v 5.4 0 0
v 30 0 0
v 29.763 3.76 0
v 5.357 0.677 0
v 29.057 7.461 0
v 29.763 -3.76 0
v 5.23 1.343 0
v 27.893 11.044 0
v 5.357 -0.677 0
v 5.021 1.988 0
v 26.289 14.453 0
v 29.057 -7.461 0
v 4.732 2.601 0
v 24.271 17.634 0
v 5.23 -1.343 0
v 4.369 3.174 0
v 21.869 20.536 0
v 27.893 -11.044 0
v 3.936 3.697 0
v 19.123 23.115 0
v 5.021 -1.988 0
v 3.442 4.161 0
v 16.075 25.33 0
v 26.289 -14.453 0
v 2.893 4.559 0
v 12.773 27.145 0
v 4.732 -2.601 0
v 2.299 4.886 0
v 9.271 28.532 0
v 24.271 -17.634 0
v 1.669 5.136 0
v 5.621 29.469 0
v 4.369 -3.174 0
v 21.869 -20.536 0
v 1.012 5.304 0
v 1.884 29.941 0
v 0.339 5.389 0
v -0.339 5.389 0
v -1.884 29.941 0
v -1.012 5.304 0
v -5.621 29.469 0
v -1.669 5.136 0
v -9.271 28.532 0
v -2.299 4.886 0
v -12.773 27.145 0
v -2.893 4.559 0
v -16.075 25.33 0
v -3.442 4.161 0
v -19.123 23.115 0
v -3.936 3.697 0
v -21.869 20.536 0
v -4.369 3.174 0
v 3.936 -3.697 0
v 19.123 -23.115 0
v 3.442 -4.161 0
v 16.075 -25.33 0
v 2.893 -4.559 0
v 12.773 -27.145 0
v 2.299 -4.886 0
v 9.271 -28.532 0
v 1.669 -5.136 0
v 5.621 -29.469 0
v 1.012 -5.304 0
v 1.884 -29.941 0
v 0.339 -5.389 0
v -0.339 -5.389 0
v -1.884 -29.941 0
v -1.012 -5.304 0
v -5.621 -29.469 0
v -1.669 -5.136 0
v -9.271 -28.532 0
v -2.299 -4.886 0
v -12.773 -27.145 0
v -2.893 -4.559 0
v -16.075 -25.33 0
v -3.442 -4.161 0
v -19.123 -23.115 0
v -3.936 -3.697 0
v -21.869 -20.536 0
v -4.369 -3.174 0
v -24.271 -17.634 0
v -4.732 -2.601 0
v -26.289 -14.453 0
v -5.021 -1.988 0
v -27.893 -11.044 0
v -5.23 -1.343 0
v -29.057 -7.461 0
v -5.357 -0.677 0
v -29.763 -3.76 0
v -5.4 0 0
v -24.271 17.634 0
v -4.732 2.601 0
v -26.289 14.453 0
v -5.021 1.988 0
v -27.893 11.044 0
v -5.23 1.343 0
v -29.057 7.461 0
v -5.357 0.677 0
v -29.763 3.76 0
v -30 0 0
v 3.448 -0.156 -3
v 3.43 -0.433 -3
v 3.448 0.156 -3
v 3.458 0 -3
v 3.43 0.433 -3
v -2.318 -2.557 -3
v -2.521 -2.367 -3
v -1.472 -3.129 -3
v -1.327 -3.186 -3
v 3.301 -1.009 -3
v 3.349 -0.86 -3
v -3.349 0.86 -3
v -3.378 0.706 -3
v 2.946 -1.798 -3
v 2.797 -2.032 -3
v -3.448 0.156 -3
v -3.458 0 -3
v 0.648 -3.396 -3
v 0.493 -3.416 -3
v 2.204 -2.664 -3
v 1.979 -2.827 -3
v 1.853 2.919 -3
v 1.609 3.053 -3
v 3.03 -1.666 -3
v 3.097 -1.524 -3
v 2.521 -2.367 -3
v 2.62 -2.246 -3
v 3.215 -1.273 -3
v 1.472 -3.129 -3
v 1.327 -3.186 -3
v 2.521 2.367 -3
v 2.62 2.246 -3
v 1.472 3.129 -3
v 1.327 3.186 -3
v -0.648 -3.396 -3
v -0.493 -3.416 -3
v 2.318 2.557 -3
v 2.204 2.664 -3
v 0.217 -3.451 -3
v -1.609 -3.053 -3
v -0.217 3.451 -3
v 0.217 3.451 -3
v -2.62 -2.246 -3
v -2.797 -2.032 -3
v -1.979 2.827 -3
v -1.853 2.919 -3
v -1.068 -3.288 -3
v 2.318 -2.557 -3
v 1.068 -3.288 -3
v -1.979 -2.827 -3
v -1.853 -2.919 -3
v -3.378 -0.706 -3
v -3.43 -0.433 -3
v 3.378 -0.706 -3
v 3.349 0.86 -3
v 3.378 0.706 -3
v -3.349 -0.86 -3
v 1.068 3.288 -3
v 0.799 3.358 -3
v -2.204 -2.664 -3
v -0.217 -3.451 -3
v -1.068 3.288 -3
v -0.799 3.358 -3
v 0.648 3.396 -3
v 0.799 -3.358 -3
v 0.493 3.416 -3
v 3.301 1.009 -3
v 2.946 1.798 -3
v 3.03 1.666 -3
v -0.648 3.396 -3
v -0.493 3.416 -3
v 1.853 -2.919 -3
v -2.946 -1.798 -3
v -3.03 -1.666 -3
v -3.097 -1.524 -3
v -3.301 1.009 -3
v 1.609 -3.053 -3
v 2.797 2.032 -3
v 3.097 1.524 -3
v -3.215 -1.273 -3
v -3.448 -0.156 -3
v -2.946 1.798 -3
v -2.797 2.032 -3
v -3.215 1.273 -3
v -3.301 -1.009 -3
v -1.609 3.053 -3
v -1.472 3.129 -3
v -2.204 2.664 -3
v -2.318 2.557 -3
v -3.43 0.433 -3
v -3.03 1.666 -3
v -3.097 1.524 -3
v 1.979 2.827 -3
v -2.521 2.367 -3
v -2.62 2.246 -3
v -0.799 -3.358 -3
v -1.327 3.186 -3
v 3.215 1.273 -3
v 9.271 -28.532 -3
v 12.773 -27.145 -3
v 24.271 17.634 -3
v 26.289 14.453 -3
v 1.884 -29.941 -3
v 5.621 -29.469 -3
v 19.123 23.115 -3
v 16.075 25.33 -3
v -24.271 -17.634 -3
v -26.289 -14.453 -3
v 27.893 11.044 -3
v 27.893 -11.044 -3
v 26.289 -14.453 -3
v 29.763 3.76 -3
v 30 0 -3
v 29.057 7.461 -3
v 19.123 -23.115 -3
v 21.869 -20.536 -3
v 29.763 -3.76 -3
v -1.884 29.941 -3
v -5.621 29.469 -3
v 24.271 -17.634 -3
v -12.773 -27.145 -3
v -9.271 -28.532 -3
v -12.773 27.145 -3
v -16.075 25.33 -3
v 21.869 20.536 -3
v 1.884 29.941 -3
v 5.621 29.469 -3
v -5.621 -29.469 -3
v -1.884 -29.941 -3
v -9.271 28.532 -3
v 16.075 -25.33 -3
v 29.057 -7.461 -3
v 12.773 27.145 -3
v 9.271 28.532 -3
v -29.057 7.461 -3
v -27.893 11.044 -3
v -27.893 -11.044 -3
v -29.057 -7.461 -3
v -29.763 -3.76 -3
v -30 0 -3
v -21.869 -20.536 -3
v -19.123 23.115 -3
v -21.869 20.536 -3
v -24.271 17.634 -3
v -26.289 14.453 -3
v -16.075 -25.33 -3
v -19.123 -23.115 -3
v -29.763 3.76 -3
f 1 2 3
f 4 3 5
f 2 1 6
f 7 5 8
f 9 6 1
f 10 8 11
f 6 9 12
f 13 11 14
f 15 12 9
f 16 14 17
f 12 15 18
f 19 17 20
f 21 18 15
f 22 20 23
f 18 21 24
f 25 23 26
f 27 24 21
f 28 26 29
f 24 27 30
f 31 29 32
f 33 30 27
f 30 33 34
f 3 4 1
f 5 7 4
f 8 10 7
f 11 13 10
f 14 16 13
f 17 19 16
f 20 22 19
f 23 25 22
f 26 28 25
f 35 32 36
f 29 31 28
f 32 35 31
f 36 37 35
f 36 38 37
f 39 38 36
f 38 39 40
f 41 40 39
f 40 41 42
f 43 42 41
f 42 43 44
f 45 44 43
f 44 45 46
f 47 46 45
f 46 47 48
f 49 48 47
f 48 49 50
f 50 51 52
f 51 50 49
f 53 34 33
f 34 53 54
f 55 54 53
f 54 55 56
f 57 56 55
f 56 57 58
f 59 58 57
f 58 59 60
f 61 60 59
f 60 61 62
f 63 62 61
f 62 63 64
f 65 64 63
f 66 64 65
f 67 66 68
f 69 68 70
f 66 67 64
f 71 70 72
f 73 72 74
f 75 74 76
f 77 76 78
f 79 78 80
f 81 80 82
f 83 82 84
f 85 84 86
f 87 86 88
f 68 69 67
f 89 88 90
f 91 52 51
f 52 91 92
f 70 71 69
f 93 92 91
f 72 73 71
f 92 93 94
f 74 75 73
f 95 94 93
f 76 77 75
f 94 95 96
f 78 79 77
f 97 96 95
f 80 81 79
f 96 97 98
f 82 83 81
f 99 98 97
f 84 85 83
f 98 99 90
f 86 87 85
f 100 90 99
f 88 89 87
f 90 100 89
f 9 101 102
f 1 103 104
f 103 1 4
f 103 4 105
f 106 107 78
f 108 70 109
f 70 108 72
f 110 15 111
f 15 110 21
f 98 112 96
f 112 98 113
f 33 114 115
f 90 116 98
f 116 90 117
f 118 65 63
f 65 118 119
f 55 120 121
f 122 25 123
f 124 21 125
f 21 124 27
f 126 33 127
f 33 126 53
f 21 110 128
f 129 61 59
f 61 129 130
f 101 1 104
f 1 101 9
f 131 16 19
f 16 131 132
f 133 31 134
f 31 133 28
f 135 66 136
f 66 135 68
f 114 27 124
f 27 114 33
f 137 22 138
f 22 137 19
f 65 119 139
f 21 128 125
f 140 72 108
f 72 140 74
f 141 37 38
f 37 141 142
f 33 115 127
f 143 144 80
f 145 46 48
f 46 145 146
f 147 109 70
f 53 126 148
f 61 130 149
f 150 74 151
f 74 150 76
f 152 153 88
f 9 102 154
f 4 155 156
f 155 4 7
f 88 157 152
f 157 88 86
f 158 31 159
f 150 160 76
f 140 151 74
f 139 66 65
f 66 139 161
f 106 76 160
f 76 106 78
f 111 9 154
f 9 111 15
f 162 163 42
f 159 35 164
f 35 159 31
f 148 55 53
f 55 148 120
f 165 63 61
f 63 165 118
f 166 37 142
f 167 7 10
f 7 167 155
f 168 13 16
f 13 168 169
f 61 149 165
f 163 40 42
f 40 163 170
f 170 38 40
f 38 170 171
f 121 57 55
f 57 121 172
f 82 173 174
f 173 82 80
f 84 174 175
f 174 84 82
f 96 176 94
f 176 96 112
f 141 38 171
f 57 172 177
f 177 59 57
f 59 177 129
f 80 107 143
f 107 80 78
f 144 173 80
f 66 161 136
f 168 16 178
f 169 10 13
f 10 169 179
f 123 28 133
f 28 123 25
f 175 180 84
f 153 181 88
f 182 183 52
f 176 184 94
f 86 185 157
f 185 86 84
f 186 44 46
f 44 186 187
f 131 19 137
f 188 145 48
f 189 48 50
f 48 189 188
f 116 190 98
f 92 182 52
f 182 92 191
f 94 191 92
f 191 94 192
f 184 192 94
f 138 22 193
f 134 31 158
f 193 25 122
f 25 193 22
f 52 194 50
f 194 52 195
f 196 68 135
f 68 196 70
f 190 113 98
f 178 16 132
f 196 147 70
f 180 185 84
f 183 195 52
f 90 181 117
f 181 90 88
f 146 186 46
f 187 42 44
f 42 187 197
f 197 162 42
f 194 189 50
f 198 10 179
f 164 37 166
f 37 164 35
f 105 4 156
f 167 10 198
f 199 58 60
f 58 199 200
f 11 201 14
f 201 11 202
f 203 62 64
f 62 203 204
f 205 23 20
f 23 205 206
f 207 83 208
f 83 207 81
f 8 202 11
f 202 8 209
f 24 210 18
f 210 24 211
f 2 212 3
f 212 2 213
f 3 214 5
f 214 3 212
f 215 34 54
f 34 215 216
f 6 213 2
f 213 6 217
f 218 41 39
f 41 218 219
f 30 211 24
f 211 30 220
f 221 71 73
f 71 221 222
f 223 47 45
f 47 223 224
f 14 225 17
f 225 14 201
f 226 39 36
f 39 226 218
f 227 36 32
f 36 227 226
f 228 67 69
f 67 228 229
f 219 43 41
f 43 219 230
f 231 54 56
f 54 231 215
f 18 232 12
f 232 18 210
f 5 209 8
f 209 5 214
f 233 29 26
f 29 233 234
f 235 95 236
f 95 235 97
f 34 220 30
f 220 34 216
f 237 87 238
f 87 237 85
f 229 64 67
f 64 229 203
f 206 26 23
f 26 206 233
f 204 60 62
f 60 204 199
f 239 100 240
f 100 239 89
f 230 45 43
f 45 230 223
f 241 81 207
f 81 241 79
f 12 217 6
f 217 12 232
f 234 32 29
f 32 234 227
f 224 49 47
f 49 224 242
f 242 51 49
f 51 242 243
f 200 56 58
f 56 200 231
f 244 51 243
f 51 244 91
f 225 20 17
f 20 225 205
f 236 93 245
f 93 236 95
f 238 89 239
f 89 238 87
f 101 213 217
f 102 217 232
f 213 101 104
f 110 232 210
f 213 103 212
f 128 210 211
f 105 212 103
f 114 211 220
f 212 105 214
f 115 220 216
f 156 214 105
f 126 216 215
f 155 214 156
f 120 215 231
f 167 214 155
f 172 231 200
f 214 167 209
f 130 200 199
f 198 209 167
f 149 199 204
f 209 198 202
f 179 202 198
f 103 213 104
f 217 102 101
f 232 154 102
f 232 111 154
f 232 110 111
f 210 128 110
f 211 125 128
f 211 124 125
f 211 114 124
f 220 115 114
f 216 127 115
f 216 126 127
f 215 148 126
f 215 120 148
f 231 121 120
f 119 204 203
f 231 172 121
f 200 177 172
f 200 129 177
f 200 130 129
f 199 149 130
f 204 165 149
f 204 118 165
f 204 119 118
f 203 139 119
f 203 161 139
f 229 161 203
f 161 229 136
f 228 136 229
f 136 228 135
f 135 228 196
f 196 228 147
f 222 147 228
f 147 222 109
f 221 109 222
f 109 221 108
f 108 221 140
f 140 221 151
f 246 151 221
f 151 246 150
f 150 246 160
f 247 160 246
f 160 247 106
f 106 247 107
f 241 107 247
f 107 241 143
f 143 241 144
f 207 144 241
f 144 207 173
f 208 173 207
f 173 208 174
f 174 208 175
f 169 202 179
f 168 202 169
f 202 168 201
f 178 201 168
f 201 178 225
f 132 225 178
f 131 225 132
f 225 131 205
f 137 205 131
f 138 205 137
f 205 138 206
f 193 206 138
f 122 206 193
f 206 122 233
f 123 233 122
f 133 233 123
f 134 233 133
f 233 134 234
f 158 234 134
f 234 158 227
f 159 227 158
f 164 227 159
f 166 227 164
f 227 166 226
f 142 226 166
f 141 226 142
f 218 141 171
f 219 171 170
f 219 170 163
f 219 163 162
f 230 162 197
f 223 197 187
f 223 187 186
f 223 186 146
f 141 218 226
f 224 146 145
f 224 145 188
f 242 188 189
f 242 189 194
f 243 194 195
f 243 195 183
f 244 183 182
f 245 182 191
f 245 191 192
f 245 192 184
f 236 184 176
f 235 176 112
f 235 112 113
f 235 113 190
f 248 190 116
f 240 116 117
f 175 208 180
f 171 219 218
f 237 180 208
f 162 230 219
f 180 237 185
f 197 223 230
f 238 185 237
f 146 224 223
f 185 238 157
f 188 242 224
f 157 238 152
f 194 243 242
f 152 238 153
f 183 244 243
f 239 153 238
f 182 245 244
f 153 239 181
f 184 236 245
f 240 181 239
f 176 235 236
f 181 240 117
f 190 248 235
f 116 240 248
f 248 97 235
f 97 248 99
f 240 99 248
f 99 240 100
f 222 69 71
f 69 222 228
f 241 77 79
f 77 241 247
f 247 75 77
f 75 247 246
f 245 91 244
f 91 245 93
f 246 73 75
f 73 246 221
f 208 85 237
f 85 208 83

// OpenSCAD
$fn = 50;

difference() {
	union() {
		translate(v = [0, 0, -3.0]) {
			cylinder(h = 3, r = 30.0);
		}
	}
	union() {
		translate(v = [0, 0, 0]) {
			rotate(a = [0, 0, 0]) {
				difference() {
					union() {
						translate(v = [0, 0, -6.0]) {
							cylinder(h = 6, r = 2.6);
						}
						translate(v = [0, 0, -3.9]) {
							cylinder(h = 3.9, r1 = 2.875, r2 = 5.4);
						}
						translate(v = [0, 0, -6.0]) {
							cylinder(h = 6, r = 2.875);
						}
						translate(v = [0, 0, -6.0]) {
							cylinder(h = 6, r = 2.6);
						}
					}
					union();
				}
			}
		}
	}
}
